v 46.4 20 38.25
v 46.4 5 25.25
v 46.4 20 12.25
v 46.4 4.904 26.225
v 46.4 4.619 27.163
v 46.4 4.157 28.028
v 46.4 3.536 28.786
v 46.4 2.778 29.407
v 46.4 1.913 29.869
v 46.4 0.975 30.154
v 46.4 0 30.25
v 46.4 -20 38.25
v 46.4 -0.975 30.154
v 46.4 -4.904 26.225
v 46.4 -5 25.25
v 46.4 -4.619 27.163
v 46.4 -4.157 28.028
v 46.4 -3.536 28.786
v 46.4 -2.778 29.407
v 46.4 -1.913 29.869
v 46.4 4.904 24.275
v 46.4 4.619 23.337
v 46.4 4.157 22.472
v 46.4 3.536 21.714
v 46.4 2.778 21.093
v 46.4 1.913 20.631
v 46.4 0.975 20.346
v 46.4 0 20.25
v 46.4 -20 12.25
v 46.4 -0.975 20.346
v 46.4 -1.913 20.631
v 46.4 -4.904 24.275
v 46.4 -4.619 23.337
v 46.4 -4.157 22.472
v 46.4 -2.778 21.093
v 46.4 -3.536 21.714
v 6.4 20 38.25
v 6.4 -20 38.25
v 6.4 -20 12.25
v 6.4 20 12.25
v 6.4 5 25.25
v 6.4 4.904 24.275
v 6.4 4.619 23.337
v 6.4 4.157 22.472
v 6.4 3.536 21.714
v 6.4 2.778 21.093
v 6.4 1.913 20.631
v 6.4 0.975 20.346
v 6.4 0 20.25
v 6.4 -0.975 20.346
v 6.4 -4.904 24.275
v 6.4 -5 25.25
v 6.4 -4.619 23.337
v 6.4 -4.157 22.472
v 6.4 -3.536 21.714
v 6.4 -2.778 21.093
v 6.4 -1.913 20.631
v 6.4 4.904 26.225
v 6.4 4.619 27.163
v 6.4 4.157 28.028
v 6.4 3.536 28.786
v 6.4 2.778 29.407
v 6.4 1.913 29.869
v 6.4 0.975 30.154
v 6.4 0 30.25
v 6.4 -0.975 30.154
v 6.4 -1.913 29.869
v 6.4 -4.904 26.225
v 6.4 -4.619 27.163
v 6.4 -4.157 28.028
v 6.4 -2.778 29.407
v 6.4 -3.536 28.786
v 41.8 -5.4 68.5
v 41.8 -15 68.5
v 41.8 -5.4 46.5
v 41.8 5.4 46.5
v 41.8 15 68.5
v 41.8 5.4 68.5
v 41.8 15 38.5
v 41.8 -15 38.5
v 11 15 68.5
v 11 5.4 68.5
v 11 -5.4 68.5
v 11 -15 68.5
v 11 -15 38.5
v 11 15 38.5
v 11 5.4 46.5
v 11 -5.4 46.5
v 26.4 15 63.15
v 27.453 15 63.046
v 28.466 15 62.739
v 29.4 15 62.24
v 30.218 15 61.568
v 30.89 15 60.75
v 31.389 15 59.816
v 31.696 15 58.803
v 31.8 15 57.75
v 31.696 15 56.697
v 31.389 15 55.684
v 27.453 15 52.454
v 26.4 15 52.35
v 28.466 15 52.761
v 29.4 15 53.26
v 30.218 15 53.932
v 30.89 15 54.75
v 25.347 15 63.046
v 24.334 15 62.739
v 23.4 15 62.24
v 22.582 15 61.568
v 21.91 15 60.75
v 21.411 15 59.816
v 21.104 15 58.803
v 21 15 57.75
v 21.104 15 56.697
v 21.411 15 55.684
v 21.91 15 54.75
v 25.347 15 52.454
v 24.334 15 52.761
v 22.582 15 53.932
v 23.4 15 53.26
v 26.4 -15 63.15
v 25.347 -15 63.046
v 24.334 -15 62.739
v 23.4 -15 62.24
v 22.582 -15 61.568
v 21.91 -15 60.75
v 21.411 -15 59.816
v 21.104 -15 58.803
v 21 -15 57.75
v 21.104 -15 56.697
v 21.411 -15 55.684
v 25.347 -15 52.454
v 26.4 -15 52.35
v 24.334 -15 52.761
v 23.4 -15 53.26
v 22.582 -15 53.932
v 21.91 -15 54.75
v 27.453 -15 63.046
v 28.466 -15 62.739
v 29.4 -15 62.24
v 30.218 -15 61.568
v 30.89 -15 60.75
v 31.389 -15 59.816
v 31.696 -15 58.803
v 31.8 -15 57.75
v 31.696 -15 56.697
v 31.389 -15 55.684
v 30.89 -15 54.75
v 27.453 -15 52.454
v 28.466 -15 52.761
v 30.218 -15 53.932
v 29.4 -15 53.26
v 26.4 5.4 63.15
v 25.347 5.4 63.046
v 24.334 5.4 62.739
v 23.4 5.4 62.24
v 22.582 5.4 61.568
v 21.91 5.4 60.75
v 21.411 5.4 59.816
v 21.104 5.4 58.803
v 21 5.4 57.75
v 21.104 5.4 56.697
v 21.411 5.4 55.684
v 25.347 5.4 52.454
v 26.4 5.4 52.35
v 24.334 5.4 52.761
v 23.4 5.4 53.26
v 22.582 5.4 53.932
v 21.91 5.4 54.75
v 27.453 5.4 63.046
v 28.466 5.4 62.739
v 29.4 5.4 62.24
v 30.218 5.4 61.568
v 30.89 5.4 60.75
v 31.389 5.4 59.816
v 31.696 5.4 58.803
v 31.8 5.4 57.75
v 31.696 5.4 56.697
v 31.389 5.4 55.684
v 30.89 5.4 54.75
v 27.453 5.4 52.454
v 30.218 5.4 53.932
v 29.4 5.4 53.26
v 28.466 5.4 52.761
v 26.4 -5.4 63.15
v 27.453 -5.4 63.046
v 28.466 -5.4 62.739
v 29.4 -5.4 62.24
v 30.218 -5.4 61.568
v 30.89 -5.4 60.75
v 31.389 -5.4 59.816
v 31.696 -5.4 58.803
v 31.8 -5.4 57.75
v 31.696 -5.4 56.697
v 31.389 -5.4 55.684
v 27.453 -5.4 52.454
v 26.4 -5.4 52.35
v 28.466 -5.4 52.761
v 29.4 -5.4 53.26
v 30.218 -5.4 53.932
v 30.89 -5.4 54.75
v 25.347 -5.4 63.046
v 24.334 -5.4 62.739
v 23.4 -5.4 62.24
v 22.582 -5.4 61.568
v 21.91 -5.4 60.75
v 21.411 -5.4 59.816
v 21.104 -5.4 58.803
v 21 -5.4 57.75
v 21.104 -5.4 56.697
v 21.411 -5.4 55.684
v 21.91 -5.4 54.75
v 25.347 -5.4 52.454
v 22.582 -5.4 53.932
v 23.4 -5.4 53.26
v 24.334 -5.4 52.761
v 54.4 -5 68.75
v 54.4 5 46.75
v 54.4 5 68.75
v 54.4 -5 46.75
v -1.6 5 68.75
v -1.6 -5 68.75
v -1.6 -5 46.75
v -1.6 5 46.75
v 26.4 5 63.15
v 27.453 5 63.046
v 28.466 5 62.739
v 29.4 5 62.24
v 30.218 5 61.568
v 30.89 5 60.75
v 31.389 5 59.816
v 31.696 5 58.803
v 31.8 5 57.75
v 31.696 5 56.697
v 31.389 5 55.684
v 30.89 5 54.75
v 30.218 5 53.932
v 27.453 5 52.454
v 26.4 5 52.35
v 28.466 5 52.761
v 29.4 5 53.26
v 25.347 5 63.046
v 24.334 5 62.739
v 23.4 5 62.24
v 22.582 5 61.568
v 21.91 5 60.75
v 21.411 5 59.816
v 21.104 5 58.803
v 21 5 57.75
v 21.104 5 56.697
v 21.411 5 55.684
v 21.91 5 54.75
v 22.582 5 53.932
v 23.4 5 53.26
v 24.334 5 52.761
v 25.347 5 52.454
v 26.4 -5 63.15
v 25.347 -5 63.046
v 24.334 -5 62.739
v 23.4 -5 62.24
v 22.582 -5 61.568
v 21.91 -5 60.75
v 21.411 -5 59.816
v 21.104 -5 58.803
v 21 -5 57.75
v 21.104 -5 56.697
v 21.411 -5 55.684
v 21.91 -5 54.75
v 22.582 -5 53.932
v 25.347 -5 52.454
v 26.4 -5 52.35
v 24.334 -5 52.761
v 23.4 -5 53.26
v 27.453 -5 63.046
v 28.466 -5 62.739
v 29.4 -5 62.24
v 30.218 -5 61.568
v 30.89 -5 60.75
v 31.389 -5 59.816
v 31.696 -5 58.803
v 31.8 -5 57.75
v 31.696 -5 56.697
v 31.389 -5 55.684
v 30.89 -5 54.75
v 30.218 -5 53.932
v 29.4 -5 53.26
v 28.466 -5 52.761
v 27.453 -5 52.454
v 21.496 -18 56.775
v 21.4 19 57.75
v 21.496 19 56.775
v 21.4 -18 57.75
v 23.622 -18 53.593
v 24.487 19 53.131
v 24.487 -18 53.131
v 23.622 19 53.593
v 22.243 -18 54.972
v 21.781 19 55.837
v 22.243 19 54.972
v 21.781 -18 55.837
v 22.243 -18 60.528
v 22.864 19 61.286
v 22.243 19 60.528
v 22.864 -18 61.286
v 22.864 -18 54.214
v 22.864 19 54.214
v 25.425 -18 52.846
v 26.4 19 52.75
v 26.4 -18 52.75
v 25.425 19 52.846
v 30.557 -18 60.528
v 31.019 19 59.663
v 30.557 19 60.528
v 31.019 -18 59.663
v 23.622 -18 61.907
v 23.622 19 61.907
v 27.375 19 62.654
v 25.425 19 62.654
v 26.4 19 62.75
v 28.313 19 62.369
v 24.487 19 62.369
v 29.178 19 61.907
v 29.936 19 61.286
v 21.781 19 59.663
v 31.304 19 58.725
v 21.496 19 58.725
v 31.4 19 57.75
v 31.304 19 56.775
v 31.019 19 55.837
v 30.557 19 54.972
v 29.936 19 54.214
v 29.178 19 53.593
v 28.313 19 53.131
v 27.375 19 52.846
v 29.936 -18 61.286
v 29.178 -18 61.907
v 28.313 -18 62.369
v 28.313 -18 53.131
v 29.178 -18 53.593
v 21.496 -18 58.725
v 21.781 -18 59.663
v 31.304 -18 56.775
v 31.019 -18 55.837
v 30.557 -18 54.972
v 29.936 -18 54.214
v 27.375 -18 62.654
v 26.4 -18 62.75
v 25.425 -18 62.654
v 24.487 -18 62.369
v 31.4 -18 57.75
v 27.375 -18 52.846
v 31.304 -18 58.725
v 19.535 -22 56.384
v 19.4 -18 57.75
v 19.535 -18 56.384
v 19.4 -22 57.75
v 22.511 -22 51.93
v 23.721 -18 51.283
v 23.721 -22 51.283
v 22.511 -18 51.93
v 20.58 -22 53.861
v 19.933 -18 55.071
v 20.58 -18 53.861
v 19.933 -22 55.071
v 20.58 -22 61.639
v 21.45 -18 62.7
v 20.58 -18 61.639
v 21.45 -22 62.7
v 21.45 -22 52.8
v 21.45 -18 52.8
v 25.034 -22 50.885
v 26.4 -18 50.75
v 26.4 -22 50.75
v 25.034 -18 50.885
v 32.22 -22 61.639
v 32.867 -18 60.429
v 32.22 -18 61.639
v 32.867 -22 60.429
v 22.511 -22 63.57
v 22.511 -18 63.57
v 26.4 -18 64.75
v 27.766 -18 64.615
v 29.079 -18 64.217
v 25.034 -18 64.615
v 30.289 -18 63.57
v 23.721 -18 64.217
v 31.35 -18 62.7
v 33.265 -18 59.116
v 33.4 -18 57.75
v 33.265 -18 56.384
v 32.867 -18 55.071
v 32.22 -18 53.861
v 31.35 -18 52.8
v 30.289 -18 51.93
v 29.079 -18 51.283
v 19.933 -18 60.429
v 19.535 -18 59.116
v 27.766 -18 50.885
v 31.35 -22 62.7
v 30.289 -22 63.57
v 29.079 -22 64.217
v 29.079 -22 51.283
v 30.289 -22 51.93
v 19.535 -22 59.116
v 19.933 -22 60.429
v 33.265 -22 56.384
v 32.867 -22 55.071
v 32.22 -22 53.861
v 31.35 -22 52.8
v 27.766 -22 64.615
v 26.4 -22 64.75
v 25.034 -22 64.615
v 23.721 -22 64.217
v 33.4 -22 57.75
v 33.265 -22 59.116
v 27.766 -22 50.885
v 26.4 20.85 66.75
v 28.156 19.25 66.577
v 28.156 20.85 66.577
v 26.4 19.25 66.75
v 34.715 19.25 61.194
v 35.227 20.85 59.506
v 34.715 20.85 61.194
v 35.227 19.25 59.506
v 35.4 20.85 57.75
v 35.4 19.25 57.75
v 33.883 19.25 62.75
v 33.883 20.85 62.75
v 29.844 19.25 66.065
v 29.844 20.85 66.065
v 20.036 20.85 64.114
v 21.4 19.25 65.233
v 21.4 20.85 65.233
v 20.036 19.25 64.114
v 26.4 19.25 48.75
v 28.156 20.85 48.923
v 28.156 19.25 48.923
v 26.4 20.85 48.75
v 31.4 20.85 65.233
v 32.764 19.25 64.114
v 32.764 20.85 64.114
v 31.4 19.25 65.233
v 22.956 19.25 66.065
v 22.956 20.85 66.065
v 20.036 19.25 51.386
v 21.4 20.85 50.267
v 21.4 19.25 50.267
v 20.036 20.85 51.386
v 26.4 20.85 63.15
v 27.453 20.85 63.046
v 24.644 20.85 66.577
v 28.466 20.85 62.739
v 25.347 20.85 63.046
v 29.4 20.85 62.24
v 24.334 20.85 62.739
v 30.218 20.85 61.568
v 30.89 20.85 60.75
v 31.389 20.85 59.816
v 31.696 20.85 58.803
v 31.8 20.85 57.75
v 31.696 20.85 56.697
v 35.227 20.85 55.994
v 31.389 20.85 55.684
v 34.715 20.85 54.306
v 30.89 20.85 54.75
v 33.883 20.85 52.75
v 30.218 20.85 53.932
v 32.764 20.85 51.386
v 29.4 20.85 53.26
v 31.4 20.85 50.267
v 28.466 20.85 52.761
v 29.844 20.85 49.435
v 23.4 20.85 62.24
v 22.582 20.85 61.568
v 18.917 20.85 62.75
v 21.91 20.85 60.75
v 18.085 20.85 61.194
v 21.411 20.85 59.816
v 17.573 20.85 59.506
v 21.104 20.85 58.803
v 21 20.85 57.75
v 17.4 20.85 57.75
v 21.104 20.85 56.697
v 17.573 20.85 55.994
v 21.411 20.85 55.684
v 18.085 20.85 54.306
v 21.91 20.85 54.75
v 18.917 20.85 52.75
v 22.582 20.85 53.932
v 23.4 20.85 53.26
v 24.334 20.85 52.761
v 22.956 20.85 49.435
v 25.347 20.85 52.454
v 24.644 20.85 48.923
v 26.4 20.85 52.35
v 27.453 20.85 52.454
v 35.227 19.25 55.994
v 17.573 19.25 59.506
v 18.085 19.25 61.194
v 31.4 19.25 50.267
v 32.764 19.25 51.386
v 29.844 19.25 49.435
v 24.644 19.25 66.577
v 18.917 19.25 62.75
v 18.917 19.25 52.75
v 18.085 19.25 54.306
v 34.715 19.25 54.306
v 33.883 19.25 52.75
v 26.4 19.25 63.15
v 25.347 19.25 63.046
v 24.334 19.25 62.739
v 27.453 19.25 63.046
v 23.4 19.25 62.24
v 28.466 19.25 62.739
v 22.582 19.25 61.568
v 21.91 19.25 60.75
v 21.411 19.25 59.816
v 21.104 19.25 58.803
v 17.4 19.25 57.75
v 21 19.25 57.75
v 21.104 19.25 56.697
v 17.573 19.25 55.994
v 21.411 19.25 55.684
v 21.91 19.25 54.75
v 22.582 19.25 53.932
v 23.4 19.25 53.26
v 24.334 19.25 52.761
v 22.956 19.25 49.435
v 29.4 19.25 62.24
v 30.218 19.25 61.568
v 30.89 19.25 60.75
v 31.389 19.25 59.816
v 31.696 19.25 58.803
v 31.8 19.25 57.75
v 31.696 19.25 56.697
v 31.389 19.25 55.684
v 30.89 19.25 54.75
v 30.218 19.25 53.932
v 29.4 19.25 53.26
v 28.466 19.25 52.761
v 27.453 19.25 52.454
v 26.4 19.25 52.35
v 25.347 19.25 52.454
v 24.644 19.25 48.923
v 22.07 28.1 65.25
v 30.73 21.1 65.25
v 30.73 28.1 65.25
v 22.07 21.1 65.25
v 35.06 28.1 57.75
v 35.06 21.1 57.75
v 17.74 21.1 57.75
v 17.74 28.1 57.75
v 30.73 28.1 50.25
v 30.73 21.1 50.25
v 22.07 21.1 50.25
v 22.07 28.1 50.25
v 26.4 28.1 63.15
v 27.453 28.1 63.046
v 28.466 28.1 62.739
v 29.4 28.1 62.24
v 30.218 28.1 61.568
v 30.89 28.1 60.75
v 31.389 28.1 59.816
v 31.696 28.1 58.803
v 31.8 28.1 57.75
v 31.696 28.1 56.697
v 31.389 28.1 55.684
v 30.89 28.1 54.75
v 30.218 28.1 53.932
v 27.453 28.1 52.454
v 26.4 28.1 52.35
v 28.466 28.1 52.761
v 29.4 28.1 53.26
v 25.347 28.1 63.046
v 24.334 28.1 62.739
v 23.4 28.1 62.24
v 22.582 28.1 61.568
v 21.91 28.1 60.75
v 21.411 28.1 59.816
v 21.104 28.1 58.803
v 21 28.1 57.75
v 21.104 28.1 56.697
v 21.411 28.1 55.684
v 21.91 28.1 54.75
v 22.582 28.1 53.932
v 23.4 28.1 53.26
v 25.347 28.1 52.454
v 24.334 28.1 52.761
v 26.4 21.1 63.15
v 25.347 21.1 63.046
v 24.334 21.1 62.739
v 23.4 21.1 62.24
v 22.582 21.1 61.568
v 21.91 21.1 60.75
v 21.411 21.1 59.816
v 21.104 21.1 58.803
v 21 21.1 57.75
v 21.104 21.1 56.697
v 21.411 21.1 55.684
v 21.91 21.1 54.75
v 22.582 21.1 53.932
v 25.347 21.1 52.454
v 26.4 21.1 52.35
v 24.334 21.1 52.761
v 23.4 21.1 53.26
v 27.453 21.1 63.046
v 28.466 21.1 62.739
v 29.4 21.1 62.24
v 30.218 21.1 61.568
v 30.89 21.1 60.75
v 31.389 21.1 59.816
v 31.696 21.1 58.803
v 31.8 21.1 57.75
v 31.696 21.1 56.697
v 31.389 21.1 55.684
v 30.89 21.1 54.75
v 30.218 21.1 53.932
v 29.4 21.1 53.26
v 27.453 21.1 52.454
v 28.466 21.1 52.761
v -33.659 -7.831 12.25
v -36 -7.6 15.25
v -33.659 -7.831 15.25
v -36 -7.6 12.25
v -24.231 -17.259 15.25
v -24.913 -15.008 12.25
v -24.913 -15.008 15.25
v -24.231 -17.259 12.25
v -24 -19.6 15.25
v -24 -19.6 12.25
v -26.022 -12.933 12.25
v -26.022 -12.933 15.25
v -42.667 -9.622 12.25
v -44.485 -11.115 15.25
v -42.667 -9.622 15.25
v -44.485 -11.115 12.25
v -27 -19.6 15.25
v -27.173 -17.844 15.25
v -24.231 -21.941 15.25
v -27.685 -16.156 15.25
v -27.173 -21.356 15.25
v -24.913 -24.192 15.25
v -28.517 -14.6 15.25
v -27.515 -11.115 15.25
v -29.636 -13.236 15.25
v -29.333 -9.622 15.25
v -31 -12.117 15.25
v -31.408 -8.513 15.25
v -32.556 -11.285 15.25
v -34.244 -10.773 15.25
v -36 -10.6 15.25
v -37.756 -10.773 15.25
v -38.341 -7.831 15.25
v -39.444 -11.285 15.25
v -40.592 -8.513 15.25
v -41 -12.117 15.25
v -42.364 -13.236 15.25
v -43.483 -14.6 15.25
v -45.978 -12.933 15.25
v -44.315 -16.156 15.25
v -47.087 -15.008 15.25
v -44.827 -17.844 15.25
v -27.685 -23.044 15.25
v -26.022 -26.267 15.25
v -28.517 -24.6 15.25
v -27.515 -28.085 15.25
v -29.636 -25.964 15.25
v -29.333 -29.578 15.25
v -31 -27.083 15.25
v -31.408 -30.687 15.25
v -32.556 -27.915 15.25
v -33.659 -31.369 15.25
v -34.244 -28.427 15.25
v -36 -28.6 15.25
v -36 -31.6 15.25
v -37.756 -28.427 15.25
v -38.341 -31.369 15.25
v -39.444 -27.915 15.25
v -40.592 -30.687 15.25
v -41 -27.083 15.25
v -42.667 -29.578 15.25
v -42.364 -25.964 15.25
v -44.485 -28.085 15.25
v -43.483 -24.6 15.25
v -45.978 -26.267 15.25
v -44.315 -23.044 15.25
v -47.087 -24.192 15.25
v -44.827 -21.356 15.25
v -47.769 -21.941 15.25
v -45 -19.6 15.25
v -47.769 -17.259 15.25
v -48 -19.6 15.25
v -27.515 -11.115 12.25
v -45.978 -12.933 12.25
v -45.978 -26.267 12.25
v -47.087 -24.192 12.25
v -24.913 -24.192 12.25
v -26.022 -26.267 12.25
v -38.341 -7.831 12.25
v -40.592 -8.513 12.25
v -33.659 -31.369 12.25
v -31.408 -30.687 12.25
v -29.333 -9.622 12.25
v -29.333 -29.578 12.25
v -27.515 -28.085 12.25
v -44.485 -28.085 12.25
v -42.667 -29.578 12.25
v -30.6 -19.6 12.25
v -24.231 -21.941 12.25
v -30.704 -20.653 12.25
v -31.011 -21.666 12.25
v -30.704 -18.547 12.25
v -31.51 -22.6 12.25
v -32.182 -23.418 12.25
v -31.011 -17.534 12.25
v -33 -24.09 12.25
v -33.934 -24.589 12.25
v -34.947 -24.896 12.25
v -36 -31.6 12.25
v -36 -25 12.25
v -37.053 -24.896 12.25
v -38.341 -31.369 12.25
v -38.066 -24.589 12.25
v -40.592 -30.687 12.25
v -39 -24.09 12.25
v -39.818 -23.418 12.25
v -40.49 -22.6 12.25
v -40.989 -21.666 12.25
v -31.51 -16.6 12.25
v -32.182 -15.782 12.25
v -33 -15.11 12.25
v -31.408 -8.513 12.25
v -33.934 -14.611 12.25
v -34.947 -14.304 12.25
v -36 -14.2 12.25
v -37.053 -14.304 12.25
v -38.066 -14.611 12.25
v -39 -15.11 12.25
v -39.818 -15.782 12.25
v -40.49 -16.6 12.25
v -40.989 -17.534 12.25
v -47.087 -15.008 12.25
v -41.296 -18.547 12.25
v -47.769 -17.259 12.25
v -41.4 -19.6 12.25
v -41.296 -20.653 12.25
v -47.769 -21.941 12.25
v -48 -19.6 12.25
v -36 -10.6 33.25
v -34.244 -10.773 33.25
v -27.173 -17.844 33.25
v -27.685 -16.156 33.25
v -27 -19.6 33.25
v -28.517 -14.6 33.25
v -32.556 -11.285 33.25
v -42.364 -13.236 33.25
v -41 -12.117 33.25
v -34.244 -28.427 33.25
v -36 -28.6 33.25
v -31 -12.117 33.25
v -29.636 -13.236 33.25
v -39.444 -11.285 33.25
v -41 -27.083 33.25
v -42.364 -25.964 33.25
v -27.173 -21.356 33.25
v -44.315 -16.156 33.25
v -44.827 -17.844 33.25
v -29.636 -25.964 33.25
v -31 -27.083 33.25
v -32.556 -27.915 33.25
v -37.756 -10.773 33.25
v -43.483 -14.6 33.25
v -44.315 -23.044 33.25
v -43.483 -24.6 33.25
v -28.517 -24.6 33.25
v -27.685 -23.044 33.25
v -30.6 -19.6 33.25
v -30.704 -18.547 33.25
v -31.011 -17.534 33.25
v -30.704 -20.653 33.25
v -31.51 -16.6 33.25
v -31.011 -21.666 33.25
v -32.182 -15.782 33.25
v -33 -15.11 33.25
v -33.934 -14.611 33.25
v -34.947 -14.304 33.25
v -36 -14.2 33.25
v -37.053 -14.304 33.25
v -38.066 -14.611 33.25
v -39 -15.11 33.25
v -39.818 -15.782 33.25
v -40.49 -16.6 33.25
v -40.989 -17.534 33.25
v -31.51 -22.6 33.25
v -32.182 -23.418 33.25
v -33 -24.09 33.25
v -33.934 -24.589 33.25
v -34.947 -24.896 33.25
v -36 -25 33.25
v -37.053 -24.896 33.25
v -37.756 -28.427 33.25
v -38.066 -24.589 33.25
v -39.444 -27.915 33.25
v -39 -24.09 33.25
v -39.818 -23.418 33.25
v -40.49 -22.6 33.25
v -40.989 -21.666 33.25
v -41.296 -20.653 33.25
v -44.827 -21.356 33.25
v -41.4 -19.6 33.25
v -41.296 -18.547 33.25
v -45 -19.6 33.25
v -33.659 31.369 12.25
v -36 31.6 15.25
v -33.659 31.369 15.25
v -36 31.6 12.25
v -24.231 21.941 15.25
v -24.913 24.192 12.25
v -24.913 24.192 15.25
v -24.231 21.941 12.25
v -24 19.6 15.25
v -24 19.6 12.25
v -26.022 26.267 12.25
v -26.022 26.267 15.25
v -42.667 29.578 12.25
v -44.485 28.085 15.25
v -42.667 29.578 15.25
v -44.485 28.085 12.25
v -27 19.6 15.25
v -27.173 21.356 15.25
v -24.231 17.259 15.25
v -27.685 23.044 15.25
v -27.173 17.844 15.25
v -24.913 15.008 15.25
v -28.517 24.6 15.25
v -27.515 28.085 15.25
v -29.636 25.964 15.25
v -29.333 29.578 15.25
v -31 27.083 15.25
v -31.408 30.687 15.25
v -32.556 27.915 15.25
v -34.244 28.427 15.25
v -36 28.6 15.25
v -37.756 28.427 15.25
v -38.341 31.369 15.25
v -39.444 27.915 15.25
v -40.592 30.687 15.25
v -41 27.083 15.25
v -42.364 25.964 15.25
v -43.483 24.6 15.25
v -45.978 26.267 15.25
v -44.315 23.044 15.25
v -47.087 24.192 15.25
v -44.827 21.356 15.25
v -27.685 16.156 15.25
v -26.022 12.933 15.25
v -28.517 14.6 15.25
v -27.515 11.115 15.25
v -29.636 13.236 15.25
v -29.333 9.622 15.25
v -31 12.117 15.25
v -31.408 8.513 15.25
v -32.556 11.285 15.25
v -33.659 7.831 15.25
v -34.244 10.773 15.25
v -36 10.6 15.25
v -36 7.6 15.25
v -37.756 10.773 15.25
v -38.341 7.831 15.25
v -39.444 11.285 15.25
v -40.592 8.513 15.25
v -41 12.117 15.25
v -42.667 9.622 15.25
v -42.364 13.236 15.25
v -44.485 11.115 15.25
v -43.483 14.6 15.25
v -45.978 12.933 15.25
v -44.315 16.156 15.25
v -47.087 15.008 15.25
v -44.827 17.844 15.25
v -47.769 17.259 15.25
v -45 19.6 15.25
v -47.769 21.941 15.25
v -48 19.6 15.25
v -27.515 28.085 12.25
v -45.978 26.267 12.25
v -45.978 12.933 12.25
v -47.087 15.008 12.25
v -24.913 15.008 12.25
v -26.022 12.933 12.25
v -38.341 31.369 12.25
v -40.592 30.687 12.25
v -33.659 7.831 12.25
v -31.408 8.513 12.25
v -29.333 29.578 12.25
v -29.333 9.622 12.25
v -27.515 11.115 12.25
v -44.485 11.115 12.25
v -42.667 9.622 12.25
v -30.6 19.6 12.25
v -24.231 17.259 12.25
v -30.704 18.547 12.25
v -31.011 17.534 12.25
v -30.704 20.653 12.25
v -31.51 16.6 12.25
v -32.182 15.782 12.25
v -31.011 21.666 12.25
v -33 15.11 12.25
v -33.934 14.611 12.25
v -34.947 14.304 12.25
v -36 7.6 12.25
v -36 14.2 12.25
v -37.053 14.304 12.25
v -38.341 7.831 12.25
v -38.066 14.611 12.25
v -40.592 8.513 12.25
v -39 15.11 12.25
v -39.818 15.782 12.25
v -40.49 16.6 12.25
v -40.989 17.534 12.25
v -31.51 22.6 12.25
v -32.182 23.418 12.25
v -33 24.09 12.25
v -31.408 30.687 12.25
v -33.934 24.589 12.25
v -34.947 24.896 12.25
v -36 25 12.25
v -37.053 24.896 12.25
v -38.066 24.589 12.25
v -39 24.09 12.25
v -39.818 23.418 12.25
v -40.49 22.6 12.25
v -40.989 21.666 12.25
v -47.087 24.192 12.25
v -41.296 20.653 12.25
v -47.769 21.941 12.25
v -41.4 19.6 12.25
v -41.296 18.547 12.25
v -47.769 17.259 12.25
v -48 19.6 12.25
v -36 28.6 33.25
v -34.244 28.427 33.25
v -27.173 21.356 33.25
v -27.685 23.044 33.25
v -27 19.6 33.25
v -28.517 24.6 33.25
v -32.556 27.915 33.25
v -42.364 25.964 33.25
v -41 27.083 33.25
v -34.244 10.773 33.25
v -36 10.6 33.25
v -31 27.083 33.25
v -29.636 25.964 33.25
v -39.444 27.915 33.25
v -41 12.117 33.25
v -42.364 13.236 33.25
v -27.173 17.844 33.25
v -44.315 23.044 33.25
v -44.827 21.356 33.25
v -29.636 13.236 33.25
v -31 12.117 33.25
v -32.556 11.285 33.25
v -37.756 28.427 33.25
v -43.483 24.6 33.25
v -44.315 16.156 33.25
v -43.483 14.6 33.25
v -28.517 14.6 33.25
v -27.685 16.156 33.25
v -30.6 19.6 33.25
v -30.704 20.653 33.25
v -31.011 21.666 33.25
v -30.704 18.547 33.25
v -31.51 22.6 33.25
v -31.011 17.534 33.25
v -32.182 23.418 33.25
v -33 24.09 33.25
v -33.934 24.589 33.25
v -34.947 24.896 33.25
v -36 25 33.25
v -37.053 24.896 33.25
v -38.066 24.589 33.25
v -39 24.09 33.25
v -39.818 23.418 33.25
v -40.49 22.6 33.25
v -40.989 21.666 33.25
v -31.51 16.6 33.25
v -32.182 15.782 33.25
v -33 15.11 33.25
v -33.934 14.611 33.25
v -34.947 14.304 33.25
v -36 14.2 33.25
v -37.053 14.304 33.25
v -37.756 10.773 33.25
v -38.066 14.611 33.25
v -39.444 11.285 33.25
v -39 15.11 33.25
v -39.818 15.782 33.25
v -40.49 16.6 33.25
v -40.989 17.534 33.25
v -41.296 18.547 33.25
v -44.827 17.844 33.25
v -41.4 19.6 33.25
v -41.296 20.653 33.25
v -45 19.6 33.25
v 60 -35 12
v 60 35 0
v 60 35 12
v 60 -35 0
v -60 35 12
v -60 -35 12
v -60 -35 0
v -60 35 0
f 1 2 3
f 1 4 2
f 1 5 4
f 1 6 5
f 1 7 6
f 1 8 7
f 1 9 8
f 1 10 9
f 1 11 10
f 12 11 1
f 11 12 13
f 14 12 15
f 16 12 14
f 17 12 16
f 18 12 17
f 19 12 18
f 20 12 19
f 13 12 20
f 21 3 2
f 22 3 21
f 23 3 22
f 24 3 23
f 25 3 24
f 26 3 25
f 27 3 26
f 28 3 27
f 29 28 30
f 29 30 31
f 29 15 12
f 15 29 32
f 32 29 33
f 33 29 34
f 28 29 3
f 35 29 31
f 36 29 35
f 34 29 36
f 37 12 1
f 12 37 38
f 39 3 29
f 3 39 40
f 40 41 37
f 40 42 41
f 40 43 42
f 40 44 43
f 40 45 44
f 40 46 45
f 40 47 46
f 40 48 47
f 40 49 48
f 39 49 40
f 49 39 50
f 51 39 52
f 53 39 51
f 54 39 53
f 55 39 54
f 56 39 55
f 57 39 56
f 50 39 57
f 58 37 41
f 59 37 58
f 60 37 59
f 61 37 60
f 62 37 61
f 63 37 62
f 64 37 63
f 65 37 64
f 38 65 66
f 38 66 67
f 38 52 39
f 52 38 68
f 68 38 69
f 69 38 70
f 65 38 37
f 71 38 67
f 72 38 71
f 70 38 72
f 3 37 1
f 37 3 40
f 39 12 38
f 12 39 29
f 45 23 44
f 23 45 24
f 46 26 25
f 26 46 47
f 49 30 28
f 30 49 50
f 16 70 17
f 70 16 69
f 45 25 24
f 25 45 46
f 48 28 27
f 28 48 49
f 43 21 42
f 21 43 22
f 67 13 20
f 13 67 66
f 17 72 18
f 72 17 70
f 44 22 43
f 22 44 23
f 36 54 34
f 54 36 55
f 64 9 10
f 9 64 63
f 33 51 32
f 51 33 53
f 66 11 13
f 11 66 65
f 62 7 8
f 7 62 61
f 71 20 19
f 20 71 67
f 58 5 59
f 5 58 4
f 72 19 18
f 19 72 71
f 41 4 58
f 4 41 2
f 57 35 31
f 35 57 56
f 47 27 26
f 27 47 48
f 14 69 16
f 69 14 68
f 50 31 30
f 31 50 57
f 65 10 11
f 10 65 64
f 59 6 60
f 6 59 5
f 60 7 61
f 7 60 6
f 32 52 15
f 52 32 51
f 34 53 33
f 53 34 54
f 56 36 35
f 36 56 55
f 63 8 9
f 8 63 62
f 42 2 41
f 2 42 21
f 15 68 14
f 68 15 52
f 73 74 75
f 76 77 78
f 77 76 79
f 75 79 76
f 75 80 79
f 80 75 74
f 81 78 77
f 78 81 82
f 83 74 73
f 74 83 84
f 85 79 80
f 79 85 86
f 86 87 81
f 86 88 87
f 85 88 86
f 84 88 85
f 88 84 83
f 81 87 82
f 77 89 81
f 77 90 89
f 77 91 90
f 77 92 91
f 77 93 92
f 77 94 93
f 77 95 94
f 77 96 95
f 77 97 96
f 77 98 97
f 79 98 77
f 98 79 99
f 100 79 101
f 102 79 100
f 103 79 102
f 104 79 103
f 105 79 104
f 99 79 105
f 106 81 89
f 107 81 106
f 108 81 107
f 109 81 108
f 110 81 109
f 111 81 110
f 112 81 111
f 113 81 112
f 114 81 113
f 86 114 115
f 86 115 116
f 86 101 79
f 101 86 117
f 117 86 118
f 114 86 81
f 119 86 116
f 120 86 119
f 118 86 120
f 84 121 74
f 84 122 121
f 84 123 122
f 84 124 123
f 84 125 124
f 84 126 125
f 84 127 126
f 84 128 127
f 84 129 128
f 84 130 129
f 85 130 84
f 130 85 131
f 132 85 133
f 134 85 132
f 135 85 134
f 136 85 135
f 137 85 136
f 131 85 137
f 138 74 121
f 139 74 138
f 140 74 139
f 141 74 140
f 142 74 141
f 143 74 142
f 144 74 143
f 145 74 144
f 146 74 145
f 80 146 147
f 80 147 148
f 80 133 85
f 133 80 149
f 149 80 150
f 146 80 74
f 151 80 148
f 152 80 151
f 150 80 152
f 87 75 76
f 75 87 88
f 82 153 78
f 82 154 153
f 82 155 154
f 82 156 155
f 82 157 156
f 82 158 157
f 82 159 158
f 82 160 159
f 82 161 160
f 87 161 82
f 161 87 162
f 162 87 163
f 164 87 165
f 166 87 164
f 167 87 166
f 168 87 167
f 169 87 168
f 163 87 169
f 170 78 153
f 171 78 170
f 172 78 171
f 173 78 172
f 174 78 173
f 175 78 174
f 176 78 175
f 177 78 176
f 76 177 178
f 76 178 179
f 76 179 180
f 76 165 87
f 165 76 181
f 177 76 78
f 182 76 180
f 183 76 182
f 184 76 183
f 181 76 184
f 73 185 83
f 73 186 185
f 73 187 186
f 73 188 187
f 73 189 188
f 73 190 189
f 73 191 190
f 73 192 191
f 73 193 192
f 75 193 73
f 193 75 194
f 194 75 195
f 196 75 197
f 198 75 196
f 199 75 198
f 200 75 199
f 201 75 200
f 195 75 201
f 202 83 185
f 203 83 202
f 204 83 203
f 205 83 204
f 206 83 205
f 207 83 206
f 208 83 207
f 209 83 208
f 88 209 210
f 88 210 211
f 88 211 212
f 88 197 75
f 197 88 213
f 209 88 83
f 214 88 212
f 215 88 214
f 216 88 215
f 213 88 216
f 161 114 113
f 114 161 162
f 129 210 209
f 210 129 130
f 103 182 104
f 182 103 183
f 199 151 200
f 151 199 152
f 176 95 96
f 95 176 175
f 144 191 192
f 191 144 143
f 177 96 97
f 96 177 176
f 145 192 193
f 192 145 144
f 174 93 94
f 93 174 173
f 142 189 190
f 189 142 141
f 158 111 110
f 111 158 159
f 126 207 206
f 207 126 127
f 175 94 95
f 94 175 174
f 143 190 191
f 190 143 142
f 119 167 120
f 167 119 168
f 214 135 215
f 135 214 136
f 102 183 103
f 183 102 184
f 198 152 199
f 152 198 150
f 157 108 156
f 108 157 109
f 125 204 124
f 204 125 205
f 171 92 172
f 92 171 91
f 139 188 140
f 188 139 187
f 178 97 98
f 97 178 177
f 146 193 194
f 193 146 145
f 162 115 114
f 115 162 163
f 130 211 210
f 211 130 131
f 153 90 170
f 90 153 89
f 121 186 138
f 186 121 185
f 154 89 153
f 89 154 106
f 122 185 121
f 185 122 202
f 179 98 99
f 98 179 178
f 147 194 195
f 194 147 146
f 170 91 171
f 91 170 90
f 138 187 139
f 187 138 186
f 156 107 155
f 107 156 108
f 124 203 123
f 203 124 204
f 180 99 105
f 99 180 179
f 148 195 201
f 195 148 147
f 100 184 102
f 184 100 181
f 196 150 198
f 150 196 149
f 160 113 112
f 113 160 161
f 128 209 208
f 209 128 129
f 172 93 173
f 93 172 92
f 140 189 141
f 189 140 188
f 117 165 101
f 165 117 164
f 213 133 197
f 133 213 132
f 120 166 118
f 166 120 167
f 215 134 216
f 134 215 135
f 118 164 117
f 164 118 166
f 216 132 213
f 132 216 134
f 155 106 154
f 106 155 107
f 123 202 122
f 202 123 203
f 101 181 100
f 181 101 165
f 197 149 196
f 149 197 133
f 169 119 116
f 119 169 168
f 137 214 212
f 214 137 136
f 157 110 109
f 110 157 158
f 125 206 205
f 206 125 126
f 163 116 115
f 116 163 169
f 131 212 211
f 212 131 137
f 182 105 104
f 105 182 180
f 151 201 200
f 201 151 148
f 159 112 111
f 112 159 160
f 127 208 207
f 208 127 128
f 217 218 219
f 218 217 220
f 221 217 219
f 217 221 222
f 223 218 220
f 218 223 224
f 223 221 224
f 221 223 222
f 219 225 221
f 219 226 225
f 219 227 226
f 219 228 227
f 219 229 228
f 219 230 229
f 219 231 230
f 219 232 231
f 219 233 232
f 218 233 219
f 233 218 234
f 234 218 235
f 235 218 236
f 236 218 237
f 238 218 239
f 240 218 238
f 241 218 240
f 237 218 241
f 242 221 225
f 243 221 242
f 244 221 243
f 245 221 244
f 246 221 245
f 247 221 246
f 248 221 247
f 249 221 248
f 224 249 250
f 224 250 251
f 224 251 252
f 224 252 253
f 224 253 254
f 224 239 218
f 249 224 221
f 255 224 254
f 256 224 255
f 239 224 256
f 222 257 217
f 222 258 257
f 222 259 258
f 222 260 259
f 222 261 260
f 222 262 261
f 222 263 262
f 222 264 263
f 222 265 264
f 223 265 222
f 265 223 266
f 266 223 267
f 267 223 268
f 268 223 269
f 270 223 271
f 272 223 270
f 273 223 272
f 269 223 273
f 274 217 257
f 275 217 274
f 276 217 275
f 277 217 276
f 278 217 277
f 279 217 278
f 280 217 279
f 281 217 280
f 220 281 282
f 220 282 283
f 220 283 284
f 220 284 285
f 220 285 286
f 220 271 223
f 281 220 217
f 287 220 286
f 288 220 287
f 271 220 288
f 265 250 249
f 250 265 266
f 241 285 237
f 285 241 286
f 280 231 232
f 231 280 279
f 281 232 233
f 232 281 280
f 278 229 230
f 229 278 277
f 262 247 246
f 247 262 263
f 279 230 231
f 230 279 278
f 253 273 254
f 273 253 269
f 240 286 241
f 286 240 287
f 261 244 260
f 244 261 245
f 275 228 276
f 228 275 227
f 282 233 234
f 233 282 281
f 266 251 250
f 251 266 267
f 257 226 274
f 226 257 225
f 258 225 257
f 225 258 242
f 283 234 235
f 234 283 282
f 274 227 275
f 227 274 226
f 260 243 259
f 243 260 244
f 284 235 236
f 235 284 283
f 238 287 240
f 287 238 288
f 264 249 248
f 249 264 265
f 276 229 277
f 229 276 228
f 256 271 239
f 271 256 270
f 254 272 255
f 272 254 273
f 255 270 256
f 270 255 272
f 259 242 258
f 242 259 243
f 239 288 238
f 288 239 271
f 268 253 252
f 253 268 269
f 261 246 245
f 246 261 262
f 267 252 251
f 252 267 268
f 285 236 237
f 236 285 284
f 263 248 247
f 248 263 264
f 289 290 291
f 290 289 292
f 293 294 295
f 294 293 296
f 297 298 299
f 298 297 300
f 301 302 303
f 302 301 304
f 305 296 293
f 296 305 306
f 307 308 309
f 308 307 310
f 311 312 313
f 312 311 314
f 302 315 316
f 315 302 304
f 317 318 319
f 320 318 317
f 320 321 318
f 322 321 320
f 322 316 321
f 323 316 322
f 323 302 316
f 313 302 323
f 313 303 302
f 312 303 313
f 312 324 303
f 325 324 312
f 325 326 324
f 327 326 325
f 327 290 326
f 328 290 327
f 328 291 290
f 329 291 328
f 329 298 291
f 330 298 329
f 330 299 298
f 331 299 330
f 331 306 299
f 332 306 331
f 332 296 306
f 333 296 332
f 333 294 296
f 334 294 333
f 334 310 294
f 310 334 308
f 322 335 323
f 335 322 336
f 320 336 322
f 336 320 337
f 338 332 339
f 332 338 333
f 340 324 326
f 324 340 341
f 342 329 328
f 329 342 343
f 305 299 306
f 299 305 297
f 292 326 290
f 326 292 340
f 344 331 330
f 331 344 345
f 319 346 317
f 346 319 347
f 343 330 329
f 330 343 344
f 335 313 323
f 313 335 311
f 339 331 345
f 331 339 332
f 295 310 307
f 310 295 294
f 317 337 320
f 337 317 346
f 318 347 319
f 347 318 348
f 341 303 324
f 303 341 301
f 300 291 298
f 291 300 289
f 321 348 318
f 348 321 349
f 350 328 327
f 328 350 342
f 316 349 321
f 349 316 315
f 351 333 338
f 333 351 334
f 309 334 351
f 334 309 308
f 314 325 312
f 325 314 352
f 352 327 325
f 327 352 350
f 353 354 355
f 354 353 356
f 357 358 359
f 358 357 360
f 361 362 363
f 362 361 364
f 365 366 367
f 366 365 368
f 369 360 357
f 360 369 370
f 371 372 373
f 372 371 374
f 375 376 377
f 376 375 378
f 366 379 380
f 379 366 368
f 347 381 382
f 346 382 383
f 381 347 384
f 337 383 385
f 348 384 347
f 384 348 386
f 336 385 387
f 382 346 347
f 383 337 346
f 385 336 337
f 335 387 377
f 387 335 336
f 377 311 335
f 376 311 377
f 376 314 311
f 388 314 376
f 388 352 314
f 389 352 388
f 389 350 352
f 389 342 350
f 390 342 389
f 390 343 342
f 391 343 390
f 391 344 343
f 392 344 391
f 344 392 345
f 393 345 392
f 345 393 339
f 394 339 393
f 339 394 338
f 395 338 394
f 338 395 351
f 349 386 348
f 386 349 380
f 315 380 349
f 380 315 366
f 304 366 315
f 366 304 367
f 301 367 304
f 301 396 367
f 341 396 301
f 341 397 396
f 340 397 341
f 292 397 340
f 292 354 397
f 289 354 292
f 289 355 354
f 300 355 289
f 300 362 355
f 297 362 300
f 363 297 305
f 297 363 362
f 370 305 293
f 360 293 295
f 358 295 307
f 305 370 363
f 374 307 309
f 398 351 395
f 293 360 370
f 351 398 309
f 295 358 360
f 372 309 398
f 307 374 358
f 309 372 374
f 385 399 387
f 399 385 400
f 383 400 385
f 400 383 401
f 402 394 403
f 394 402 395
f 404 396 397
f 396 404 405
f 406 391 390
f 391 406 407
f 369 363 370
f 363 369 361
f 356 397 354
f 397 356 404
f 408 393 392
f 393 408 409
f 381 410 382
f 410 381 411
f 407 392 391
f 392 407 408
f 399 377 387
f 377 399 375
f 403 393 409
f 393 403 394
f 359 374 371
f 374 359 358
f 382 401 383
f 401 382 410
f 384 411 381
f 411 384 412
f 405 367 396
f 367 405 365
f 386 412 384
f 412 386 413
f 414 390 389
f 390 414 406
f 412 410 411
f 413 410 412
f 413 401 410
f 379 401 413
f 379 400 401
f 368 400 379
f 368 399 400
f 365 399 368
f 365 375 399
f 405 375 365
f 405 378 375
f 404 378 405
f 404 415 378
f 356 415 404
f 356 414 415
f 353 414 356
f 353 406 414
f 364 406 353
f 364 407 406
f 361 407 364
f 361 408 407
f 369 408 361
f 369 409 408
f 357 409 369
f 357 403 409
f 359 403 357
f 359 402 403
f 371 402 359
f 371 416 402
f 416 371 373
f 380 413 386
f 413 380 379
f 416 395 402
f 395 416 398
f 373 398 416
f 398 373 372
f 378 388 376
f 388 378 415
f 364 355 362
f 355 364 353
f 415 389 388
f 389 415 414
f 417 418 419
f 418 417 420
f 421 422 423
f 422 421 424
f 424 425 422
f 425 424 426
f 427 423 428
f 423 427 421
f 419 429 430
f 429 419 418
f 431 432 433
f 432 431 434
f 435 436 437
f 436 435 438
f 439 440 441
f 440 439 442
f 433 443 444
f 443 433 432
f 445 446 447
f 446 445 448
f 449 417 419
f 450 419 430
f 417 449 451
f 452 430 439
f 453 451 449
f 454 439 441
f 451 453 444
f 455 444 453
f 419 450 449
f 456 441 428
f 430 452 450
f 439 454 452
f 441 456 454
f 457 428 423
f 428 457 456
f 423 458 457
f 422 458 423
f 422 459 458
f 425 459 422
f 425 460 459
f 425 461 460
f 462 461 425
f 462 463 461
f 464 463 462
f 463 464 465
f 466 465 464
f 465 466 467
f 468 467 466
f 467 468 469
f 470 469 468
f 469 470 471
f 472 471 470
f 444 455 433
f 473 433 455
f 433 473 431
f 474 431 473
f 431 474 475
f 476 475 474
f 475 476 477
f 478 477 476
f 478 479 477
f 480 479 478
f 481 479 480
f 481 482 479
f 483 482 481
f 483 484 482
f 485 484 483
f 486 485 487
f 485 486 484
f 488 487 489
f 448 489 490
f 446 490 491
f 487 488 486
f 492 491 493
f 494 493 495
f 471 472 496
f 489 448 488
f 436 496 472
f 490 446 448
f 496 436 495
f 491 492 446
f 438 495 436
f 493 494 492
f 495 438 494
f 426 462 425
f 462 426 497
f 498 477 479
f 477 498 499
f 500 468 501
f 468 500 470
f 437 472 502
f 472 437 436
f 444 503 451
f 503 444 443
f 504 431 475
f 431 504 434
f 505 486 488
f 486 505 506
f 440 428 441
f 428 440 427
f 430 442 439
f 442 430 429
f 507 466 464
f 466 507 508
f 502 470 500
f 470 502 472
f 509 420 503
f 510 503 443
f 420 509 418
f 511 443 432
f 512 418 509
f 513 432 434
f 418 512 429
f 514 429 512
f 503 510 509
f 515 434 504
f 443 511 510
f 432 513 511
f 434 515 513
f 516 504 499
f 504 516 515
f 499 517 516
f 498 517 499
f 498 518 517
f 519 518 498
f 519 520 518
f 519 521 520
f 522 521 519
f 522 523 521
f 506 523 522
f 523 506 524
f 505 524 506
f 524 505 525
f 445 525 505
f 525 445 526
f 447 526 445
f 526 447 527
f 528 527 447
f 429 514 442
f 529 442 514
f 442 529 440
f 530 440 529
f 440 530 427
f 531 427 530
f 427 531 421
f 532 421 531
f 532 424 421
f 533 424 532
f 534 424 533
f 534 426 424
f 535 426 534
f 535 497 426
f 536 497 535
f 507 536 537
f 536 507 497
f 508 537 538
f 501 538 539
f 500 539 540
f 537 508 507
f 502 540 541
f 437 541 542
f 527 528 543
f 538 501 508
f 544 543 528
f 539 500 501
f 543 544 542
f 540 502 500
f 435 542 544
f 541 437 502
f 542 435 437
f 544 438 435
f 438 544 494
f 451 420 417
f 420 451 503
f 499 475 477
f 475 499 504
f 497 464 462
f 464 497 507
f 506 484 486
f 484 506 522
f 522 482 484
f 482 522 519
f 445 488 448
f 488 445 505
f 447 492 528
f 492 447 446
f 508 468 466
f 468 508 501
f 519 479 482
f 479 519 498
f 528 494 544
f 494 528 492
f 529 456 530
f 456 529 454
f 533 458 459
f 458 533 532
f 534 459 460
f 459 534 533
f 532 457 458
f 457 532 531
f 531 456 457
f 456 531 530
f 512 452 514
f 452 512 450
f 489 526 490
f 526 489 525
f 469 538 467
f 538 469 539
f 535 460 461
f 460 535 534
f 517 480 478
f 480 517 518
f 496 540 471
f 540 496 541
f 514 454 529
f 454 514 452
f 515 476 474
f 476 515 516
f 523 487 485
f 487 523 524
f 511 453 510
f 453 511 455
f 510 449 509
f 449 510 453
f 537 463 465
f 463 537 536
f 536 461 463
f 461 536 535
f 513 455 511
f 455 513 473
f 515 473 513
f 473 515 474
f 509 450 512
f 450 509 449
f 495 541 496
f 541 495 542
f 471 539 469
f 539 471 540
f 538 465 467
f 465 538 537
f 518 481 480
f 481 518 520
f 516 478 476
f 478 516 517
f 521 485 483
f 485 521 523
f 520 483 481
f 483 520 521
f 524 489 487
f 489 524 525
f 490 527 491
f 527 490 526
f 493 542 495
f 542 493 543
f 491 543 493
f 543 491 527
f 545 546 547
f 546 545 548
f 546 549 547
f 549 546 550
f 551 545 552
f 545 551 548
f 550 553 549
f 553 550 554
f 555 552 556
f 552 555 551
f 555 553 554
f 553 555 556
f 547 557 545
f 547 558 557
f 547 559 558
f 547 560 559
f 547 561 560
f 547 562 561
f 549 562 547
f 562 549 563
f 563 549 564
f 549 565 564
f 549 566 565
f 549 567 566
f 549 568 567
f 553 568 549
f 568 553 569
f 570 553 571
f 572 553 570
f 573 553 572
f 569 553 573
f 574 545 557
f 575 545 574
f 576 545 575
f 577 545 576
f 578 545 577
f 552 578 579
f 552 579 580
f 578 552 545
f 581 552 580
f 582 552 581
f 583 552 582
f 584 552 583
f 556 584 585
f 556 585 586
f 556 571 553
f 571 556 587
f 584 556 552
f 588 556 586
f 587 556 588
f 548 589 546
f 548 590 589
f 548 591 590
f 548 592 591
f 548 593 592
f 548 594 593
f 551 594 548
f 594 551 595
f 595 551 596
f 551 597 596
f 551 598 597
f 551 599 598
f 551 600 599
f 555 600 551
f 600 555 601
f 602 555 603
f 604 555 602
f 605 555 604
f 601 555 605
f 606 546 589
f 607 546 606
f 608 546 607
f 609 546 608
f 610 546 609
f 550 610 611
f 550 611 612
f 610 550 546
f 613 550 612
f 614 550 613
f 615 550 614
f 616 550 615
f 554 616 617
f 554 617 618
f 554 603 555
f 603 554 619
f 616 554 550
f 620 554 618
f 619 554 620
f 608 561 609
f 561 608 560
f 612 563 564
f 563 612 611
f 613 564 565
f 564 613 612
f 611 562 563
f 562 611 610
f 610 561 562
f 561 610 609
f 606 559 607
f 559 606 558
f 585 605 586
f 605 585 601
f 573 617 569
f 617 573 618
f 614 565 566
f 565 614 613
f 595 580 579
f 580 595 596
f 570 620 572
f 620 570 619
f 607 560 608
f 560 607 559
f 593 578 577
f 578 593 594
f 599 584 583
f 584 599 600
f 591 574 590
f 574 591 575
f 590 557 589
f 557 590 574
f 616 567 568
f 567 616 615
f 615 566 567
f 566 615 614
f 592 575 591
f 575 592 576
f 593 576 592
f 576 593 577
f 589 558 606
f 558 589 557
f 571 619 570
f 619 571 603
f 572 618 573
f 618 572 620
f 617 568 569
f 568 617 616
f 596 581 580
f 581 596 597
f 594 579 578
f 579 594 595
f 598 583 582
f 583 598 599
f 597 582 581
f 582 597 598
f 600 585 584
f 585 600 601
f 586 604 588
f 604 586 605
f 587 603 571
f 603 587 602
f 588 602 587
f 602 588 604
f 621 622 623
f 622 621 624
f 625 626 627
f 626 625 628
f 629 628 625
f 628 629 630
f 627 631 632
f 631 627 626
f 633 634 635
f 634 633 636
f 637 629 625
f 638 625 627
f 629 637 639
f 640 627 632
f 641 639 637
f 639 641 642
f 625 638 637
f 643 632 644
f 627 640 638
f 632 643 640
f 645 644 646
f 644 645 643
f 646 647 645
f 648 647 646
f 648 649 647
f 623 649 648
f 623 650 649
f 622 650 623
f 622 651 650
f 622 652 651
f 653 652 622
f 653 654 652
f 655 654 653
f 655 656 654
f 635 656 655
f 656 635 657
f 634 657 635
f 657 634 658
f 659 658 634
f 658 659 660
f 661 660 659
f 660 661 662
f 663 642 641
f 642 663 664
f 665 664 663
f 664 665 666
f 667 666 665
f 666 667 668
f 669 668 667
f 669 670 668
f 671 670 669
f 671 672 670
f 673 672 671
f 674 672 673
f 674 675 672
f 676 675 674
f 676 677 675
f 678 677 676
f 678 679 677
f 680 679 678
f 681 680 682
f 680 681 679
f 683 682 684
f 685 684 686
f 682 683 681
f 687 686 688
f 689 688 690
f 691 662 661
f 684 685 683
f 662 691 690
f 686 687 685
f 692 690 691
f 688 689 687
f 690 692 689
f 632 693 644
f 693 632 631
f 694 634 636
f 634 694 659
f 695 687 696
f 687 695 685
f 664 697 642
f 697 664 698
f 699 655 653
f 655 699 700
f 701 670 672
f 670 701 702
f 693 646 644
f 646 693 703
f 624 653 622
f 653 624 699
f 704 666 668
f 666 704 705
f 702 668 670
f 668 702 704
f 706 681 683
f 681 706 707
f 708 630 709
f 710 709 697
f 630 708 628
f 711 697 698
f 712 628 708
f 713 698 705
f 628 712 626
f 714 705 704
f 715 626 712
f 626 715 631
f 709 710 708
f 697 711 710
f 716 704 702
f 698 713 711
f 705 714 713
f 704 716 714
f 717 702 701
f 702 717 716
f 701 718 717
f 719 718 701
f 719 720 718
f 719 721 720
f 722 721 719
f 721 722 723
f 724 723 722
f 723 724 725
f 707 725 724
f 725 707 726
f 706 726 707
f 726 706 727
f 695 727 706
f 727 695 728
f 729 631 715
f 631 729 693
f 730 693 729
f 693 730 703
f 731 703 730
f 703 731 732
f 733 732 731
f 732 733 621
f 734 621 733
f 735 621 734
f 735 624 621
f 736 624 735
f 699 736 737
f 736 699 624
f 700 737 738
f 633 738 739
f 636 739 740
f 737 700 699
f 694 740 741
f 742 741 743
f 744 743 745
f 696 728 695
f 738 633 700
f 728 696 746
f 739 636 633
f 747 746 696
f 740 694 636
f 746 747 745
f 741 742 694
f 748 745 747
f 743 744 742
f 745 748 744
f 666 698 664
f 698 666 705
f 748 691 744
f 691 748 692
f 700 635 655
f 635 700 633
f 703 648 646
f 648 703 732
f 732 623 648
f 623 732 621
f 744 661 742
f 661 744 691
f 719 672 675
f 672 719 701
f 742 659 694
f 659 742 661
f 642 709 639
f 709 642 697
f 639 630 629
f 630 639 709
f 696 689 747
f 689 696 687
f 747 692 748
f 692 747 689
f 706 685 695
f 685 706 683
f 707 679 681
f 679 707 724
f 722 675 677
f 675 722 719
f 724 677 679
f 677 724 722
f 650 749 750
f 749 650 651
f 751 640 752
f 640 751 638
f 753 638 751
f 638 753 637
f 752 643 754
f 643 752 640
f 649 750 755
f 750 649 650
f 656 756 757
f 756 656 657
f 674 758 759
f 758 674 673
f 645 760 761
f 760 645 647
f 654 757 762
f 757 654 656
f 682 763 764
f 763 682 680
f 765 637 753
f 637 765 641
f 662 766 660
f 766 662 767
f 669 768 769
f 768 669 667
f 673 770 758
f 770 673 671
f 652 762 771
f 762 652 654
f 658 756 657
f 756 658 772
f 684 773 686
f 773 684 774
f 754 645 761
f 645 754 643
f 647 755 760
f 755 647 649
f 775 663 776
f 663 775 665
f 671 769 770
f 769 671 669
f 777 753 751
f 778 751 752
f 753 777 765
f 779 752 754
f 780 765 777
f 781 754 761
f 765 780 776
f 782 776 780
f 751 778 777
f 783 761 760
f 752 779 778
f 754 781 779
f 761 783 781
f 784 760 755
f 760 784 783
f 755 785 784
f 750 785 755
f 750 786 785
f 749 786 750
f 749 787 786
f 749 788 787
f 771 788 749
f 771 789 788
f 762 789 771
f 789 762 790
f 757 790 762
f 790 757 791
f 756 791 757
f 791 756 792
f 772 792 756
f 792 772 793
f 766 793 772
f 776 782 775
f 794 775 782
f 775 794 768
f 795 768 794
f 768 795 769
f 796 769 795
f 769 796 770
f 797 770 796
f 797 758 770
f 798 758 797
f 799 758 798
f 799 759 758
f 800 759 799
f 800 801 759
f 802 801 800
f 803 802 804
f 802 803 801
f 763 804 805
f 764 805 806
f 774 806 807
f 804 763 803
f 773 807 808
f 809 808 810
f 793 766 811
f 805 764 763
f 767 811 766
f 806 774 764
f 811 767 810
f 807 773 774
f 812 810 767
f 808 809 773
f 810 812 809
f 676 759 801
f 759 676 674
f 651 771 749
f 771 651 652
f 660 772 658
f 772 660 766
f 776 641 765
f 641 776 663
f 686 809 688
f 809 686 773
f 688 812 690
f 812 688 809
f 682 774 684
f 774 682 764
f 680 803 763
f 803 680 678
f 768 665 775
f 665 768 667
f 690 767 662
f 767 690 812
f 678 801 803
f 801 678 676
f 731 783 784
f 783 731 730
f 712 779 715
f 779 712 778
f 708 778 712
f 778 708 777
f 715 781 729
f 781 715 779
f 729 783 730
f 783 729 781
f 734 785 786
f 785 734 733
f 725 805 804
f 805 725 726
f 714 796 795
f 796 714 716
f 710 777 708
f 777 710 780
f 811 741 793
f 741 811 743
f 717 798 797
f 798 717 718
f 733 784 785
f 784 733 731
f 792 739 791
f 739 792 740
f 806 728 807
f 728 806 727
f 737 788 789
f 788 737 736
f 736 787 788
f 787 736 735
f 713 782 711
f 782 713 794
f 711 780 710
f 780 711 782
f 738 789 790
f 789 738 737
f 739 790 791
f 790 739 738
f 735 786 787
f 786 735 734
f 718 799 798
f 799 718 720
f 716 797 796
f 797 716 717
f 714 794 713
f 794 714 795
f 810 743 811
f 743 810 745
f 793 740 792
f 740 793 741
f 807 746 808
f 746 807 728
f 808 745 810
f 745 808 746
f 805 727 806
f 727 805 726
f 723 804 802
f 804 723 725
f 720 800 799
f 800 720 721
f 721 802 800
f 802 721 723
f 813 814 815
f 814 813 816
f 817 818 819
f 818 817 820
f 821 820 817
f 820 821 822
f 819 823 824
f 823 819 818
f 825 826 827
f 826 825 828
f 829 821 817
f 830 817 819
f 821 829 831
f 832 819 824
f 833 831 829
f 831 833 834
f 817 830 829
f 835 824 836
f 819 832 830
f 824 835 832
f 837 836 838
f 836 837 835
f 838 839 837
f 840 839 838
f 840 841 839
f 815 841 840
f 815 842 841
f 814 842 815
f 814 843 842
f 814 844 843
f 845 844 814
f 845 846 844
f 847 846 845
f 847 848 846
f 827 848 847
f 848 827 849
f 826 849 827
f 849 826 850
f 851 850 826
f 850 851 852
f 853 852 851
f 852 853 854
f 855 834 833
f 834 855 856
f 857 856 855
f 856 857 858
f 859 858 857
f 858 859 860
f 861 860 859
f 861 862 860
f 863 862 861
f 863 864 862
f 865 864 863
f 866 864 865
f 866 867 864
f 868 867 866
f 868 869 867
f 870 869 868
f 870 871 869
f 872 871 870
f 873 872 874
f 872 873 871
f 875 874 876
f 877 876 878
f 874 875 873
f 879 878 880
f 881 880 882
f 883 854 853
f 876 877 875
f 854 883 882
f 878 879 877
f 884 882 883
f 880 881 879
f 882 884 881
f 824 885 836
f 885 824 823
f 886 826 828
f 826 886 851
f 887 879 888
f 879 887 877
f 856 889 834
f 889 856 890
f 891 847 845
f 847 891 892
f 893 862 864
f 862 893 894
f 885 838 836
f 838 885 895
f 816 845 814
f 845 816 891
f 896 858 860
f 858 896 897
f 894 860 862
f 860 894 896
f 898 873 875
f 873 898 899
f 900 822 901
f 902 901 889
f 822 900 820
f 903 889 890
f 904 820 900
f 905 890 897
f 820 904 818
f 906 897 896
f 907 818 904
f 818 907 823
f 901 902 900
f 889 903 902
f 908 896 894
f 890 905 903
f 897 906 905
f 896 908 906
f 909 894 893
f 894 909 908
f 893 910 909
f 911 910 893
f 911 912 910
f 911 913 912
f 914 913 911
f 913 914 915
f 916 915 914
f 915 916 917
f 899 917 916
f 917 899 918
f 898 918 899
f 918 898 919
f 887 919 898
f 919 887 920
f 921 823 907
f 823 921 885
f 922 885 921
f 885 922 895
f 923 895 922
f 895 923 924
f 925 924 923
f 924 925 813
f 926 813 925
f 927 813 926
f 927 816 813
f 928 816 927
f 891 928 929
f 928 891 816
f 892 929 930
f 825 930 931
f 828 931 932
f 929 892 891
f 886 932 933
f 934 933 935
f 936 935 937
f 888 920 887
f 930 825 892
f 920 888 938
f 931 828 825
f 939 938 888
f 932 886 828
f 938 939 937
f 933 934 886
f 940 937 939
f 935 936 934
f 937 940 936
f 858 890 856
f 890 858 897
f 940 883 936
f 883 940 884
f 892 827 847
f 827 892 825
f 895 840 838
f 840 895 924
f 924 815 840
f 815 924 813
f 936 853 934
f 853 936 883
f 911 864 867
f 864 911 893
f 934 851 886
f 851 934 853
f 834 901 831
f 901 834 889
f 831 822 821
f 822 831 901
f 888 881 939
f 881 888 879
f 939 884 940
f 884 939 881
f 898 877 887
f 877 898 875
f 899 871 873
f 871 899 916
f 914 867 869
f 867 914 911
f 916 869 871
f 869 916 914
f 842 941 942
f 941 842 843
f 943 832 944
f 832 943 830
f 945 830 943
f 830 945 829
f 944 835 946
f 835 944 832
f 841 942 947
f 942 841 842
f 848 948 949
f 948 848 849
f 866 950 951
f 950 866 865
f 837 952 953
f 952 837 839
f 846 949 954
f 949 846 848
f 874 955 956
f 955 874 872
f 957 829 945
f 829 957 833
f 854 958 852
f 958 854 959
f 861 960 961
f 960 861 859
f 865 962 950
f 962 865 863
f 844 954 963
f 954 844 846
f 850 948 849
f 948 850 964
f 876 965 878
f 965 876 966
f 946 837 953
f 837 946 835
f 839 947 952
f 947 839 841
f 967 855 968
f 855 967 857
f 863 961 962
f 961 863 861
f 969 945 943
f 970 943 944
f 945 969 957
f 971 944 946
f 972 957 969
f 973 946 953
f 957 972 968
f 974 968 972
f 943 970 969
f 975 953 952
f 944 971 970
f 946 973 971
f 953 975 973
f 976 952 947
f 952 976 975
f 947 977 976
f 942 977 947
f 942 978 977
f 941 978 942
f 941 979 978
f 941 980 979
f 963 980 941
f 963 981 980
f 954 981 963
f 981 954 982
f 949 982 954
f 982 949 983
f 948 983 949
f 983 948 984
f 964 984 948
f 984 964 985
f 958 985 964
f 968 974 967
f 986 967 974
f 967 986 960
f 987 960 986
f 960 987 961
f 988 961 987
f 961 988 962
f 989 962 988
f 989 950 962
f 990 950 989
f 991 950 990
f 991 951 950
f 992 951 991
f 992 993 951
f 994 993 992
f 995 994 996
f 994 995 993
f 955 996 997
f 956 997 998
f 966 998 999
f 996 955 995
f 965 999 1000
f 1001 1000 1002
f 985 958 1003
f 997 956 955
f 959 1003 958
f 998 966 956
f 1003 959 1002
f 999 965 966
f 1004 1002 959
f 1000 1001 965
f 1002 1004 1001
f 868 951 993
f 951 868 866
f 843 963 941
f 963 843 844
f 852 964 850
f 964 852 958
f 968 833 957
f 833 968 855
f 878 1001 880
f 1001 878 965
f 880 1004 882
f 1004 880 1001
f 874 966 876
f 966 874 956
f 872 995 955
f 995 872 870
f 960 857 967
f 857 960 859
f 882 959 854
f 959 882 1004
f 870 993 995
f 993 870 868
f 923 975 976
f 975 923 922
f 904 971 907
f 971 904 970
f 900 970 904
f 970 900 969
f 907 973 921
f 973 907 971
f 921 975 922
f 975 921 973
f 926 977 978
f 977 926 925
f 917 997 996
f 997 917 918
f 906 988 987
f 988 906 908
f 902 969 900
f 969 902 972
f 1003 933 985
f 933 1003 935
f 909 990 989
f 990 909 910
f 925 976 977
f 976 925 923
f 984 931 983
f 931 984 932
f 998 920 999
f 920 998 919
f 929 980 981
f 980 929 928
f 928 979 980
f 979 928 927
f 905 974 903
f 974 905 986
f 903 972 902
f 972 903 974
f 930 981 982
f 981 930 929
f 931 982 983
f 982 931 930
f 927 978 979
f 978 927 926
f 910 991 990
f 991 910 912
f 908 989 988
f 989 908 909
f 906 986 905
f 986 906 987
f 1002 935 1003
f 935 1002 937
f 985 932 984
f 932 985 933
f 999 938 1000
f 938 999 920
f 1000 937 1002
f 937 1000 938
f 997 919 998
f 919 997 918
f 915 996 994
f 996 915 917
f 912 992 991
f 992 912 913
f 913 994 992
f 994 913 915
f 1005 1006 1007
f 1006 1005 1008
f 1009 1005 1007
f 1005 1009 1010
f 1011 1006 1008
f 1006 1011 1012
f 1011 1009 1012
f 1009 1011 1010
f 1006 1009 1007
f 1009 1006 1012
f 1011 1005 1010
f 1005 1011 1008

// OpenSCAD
$fn = 32;

// ------------------------------------------------------------------------
// Indexing jig: plate 120 x 70 mm, pin d10
// Every part is its own module, assembly() places every instance.
// ------------------------------------------------------------------------

// --- part 1 ---
module jig_plate() {
  difference() {
    translate([-60, -35, 0]) cube([120, 70, 12]);
  }
}

// --- part 2 ---
module locator_block() {
  difference() {
    translate([-20, -20, 0]) cube([40, 40, 26]);
    translate([0, 0, 13]) rotate([0, 90, 0]) cylinder(h = 42, d = 10, center = true);
  }
}

// --- part 3 ---
module index_fork() {
  difference() {
    translate([-15.4, -15, 0]) cube([30.8, 30, 30]);
    translate([-16.4, -5.4, 8]) cube([32.8, 10.8, 23]);
    translate([0, 0, 19.25]) rotate([90, 0, 0]) cylinder(h = 32, d = 10.8, center = true);
  }
}

// --- part 4 ---
module index_arm() {
  difference() {
    translate([-28, -5, 0]) cube([56, 10, 22]);
    translate([0, 0, 11]) rotate([90, 0, 0]) cylinder(h = 12, d = 10.8, center = true);
  }
}

// --- part 5 ---
module index_pin() {
  rotate([0, 90, 0]) cylinder(h = 38, d = 10, center = true);
  translate([-22, 0, 0]) rotate([0, 90, 0]) cylinder(h = 4, d = 14);
}

// --- part 6 ---
module pin_washer() {
  difference() {
      translate([0, 0, 0]) cylinder(h = 1.6, d = 18);
      translate([0, 0, -1]) cylinder(h = 3.6, d = 10.8);
    }
}

// --- part 7 ---
module lock_nut() {
  difference() {
    linear_extrude(height = 7) polygon(points = [[8.66, 0], [4.33, 7.5], [-4.33, 7.5], [-8.66, 0], [-4.33, -7.5], [4.33, -7.5]]);
    translate([0, 0, -1]) cylinder(h = 9, d = 10.8);
  }
}

// --- part 8 ---
module guide_bush_a() {
  difference() {
    union() {
      cylinder(h = 3, d = 24);
      translate([0, 0, 3]) cylinder(h = 18, d = 18);
    }
    translate([0, 0, -1]) cylinder(h = 23, d = 10.8);
  }
}

// --- part 9 ---
module guide_bush_b() {
  difference() {
    union() {
      cylinder(h = 3, d = 24);
      translate([0, 0, 3]) cylinder(h = 18, d = 18);
    }
    translate([0, 0, -1]) cylinder(h = 23, d = 10.8);
  }
}

// --- assembly ---
module assembly() {
  color([0.80, 0.24, 0.20]) translate([0, 0, 0]) rotate([0, 0, 0]) jig_plate();
  color([0.20, 0.45, 0.75]) translate([26.4, 0, 12.25]) rotate([0, 0, 0]) locator_block();
  color([0.25, 0.62, 0.32]) translate([26.4, 0, 38.5]) rotate([0, 0, 0]) index_fork();
  color([0.92, 0.70, 0.18]) translate([26.4, 0, 46.75]) rotate([0, 0, 0]) index_arm();
  color([0.58, 0.35, 0.70]) translate([26.4, 0, 57.75]) rotate([0, 0, 90]) index_pin();
  color([0.16, 0.66, 0.66]) translate([26.4, 20.85, 57.75]) rotate([90, 0, 0]) pin_washer();
  color([0.85, 0.48, 0.18]) translate([26.4, 28.1, 57.75]) rotate([90, 0, 0]) lock_nut();
  color([0.55, 0.60, 0.65]) translate([-36, -19.6, 12.25]) rotate([0, 0, 0]) guide_bush_a();
  color([0.75, 0.30, 0.55]) translate([-36, 19.6, 12.25]) rotate([0, 0, 0]) guide_bush_b();
}

assembly();
